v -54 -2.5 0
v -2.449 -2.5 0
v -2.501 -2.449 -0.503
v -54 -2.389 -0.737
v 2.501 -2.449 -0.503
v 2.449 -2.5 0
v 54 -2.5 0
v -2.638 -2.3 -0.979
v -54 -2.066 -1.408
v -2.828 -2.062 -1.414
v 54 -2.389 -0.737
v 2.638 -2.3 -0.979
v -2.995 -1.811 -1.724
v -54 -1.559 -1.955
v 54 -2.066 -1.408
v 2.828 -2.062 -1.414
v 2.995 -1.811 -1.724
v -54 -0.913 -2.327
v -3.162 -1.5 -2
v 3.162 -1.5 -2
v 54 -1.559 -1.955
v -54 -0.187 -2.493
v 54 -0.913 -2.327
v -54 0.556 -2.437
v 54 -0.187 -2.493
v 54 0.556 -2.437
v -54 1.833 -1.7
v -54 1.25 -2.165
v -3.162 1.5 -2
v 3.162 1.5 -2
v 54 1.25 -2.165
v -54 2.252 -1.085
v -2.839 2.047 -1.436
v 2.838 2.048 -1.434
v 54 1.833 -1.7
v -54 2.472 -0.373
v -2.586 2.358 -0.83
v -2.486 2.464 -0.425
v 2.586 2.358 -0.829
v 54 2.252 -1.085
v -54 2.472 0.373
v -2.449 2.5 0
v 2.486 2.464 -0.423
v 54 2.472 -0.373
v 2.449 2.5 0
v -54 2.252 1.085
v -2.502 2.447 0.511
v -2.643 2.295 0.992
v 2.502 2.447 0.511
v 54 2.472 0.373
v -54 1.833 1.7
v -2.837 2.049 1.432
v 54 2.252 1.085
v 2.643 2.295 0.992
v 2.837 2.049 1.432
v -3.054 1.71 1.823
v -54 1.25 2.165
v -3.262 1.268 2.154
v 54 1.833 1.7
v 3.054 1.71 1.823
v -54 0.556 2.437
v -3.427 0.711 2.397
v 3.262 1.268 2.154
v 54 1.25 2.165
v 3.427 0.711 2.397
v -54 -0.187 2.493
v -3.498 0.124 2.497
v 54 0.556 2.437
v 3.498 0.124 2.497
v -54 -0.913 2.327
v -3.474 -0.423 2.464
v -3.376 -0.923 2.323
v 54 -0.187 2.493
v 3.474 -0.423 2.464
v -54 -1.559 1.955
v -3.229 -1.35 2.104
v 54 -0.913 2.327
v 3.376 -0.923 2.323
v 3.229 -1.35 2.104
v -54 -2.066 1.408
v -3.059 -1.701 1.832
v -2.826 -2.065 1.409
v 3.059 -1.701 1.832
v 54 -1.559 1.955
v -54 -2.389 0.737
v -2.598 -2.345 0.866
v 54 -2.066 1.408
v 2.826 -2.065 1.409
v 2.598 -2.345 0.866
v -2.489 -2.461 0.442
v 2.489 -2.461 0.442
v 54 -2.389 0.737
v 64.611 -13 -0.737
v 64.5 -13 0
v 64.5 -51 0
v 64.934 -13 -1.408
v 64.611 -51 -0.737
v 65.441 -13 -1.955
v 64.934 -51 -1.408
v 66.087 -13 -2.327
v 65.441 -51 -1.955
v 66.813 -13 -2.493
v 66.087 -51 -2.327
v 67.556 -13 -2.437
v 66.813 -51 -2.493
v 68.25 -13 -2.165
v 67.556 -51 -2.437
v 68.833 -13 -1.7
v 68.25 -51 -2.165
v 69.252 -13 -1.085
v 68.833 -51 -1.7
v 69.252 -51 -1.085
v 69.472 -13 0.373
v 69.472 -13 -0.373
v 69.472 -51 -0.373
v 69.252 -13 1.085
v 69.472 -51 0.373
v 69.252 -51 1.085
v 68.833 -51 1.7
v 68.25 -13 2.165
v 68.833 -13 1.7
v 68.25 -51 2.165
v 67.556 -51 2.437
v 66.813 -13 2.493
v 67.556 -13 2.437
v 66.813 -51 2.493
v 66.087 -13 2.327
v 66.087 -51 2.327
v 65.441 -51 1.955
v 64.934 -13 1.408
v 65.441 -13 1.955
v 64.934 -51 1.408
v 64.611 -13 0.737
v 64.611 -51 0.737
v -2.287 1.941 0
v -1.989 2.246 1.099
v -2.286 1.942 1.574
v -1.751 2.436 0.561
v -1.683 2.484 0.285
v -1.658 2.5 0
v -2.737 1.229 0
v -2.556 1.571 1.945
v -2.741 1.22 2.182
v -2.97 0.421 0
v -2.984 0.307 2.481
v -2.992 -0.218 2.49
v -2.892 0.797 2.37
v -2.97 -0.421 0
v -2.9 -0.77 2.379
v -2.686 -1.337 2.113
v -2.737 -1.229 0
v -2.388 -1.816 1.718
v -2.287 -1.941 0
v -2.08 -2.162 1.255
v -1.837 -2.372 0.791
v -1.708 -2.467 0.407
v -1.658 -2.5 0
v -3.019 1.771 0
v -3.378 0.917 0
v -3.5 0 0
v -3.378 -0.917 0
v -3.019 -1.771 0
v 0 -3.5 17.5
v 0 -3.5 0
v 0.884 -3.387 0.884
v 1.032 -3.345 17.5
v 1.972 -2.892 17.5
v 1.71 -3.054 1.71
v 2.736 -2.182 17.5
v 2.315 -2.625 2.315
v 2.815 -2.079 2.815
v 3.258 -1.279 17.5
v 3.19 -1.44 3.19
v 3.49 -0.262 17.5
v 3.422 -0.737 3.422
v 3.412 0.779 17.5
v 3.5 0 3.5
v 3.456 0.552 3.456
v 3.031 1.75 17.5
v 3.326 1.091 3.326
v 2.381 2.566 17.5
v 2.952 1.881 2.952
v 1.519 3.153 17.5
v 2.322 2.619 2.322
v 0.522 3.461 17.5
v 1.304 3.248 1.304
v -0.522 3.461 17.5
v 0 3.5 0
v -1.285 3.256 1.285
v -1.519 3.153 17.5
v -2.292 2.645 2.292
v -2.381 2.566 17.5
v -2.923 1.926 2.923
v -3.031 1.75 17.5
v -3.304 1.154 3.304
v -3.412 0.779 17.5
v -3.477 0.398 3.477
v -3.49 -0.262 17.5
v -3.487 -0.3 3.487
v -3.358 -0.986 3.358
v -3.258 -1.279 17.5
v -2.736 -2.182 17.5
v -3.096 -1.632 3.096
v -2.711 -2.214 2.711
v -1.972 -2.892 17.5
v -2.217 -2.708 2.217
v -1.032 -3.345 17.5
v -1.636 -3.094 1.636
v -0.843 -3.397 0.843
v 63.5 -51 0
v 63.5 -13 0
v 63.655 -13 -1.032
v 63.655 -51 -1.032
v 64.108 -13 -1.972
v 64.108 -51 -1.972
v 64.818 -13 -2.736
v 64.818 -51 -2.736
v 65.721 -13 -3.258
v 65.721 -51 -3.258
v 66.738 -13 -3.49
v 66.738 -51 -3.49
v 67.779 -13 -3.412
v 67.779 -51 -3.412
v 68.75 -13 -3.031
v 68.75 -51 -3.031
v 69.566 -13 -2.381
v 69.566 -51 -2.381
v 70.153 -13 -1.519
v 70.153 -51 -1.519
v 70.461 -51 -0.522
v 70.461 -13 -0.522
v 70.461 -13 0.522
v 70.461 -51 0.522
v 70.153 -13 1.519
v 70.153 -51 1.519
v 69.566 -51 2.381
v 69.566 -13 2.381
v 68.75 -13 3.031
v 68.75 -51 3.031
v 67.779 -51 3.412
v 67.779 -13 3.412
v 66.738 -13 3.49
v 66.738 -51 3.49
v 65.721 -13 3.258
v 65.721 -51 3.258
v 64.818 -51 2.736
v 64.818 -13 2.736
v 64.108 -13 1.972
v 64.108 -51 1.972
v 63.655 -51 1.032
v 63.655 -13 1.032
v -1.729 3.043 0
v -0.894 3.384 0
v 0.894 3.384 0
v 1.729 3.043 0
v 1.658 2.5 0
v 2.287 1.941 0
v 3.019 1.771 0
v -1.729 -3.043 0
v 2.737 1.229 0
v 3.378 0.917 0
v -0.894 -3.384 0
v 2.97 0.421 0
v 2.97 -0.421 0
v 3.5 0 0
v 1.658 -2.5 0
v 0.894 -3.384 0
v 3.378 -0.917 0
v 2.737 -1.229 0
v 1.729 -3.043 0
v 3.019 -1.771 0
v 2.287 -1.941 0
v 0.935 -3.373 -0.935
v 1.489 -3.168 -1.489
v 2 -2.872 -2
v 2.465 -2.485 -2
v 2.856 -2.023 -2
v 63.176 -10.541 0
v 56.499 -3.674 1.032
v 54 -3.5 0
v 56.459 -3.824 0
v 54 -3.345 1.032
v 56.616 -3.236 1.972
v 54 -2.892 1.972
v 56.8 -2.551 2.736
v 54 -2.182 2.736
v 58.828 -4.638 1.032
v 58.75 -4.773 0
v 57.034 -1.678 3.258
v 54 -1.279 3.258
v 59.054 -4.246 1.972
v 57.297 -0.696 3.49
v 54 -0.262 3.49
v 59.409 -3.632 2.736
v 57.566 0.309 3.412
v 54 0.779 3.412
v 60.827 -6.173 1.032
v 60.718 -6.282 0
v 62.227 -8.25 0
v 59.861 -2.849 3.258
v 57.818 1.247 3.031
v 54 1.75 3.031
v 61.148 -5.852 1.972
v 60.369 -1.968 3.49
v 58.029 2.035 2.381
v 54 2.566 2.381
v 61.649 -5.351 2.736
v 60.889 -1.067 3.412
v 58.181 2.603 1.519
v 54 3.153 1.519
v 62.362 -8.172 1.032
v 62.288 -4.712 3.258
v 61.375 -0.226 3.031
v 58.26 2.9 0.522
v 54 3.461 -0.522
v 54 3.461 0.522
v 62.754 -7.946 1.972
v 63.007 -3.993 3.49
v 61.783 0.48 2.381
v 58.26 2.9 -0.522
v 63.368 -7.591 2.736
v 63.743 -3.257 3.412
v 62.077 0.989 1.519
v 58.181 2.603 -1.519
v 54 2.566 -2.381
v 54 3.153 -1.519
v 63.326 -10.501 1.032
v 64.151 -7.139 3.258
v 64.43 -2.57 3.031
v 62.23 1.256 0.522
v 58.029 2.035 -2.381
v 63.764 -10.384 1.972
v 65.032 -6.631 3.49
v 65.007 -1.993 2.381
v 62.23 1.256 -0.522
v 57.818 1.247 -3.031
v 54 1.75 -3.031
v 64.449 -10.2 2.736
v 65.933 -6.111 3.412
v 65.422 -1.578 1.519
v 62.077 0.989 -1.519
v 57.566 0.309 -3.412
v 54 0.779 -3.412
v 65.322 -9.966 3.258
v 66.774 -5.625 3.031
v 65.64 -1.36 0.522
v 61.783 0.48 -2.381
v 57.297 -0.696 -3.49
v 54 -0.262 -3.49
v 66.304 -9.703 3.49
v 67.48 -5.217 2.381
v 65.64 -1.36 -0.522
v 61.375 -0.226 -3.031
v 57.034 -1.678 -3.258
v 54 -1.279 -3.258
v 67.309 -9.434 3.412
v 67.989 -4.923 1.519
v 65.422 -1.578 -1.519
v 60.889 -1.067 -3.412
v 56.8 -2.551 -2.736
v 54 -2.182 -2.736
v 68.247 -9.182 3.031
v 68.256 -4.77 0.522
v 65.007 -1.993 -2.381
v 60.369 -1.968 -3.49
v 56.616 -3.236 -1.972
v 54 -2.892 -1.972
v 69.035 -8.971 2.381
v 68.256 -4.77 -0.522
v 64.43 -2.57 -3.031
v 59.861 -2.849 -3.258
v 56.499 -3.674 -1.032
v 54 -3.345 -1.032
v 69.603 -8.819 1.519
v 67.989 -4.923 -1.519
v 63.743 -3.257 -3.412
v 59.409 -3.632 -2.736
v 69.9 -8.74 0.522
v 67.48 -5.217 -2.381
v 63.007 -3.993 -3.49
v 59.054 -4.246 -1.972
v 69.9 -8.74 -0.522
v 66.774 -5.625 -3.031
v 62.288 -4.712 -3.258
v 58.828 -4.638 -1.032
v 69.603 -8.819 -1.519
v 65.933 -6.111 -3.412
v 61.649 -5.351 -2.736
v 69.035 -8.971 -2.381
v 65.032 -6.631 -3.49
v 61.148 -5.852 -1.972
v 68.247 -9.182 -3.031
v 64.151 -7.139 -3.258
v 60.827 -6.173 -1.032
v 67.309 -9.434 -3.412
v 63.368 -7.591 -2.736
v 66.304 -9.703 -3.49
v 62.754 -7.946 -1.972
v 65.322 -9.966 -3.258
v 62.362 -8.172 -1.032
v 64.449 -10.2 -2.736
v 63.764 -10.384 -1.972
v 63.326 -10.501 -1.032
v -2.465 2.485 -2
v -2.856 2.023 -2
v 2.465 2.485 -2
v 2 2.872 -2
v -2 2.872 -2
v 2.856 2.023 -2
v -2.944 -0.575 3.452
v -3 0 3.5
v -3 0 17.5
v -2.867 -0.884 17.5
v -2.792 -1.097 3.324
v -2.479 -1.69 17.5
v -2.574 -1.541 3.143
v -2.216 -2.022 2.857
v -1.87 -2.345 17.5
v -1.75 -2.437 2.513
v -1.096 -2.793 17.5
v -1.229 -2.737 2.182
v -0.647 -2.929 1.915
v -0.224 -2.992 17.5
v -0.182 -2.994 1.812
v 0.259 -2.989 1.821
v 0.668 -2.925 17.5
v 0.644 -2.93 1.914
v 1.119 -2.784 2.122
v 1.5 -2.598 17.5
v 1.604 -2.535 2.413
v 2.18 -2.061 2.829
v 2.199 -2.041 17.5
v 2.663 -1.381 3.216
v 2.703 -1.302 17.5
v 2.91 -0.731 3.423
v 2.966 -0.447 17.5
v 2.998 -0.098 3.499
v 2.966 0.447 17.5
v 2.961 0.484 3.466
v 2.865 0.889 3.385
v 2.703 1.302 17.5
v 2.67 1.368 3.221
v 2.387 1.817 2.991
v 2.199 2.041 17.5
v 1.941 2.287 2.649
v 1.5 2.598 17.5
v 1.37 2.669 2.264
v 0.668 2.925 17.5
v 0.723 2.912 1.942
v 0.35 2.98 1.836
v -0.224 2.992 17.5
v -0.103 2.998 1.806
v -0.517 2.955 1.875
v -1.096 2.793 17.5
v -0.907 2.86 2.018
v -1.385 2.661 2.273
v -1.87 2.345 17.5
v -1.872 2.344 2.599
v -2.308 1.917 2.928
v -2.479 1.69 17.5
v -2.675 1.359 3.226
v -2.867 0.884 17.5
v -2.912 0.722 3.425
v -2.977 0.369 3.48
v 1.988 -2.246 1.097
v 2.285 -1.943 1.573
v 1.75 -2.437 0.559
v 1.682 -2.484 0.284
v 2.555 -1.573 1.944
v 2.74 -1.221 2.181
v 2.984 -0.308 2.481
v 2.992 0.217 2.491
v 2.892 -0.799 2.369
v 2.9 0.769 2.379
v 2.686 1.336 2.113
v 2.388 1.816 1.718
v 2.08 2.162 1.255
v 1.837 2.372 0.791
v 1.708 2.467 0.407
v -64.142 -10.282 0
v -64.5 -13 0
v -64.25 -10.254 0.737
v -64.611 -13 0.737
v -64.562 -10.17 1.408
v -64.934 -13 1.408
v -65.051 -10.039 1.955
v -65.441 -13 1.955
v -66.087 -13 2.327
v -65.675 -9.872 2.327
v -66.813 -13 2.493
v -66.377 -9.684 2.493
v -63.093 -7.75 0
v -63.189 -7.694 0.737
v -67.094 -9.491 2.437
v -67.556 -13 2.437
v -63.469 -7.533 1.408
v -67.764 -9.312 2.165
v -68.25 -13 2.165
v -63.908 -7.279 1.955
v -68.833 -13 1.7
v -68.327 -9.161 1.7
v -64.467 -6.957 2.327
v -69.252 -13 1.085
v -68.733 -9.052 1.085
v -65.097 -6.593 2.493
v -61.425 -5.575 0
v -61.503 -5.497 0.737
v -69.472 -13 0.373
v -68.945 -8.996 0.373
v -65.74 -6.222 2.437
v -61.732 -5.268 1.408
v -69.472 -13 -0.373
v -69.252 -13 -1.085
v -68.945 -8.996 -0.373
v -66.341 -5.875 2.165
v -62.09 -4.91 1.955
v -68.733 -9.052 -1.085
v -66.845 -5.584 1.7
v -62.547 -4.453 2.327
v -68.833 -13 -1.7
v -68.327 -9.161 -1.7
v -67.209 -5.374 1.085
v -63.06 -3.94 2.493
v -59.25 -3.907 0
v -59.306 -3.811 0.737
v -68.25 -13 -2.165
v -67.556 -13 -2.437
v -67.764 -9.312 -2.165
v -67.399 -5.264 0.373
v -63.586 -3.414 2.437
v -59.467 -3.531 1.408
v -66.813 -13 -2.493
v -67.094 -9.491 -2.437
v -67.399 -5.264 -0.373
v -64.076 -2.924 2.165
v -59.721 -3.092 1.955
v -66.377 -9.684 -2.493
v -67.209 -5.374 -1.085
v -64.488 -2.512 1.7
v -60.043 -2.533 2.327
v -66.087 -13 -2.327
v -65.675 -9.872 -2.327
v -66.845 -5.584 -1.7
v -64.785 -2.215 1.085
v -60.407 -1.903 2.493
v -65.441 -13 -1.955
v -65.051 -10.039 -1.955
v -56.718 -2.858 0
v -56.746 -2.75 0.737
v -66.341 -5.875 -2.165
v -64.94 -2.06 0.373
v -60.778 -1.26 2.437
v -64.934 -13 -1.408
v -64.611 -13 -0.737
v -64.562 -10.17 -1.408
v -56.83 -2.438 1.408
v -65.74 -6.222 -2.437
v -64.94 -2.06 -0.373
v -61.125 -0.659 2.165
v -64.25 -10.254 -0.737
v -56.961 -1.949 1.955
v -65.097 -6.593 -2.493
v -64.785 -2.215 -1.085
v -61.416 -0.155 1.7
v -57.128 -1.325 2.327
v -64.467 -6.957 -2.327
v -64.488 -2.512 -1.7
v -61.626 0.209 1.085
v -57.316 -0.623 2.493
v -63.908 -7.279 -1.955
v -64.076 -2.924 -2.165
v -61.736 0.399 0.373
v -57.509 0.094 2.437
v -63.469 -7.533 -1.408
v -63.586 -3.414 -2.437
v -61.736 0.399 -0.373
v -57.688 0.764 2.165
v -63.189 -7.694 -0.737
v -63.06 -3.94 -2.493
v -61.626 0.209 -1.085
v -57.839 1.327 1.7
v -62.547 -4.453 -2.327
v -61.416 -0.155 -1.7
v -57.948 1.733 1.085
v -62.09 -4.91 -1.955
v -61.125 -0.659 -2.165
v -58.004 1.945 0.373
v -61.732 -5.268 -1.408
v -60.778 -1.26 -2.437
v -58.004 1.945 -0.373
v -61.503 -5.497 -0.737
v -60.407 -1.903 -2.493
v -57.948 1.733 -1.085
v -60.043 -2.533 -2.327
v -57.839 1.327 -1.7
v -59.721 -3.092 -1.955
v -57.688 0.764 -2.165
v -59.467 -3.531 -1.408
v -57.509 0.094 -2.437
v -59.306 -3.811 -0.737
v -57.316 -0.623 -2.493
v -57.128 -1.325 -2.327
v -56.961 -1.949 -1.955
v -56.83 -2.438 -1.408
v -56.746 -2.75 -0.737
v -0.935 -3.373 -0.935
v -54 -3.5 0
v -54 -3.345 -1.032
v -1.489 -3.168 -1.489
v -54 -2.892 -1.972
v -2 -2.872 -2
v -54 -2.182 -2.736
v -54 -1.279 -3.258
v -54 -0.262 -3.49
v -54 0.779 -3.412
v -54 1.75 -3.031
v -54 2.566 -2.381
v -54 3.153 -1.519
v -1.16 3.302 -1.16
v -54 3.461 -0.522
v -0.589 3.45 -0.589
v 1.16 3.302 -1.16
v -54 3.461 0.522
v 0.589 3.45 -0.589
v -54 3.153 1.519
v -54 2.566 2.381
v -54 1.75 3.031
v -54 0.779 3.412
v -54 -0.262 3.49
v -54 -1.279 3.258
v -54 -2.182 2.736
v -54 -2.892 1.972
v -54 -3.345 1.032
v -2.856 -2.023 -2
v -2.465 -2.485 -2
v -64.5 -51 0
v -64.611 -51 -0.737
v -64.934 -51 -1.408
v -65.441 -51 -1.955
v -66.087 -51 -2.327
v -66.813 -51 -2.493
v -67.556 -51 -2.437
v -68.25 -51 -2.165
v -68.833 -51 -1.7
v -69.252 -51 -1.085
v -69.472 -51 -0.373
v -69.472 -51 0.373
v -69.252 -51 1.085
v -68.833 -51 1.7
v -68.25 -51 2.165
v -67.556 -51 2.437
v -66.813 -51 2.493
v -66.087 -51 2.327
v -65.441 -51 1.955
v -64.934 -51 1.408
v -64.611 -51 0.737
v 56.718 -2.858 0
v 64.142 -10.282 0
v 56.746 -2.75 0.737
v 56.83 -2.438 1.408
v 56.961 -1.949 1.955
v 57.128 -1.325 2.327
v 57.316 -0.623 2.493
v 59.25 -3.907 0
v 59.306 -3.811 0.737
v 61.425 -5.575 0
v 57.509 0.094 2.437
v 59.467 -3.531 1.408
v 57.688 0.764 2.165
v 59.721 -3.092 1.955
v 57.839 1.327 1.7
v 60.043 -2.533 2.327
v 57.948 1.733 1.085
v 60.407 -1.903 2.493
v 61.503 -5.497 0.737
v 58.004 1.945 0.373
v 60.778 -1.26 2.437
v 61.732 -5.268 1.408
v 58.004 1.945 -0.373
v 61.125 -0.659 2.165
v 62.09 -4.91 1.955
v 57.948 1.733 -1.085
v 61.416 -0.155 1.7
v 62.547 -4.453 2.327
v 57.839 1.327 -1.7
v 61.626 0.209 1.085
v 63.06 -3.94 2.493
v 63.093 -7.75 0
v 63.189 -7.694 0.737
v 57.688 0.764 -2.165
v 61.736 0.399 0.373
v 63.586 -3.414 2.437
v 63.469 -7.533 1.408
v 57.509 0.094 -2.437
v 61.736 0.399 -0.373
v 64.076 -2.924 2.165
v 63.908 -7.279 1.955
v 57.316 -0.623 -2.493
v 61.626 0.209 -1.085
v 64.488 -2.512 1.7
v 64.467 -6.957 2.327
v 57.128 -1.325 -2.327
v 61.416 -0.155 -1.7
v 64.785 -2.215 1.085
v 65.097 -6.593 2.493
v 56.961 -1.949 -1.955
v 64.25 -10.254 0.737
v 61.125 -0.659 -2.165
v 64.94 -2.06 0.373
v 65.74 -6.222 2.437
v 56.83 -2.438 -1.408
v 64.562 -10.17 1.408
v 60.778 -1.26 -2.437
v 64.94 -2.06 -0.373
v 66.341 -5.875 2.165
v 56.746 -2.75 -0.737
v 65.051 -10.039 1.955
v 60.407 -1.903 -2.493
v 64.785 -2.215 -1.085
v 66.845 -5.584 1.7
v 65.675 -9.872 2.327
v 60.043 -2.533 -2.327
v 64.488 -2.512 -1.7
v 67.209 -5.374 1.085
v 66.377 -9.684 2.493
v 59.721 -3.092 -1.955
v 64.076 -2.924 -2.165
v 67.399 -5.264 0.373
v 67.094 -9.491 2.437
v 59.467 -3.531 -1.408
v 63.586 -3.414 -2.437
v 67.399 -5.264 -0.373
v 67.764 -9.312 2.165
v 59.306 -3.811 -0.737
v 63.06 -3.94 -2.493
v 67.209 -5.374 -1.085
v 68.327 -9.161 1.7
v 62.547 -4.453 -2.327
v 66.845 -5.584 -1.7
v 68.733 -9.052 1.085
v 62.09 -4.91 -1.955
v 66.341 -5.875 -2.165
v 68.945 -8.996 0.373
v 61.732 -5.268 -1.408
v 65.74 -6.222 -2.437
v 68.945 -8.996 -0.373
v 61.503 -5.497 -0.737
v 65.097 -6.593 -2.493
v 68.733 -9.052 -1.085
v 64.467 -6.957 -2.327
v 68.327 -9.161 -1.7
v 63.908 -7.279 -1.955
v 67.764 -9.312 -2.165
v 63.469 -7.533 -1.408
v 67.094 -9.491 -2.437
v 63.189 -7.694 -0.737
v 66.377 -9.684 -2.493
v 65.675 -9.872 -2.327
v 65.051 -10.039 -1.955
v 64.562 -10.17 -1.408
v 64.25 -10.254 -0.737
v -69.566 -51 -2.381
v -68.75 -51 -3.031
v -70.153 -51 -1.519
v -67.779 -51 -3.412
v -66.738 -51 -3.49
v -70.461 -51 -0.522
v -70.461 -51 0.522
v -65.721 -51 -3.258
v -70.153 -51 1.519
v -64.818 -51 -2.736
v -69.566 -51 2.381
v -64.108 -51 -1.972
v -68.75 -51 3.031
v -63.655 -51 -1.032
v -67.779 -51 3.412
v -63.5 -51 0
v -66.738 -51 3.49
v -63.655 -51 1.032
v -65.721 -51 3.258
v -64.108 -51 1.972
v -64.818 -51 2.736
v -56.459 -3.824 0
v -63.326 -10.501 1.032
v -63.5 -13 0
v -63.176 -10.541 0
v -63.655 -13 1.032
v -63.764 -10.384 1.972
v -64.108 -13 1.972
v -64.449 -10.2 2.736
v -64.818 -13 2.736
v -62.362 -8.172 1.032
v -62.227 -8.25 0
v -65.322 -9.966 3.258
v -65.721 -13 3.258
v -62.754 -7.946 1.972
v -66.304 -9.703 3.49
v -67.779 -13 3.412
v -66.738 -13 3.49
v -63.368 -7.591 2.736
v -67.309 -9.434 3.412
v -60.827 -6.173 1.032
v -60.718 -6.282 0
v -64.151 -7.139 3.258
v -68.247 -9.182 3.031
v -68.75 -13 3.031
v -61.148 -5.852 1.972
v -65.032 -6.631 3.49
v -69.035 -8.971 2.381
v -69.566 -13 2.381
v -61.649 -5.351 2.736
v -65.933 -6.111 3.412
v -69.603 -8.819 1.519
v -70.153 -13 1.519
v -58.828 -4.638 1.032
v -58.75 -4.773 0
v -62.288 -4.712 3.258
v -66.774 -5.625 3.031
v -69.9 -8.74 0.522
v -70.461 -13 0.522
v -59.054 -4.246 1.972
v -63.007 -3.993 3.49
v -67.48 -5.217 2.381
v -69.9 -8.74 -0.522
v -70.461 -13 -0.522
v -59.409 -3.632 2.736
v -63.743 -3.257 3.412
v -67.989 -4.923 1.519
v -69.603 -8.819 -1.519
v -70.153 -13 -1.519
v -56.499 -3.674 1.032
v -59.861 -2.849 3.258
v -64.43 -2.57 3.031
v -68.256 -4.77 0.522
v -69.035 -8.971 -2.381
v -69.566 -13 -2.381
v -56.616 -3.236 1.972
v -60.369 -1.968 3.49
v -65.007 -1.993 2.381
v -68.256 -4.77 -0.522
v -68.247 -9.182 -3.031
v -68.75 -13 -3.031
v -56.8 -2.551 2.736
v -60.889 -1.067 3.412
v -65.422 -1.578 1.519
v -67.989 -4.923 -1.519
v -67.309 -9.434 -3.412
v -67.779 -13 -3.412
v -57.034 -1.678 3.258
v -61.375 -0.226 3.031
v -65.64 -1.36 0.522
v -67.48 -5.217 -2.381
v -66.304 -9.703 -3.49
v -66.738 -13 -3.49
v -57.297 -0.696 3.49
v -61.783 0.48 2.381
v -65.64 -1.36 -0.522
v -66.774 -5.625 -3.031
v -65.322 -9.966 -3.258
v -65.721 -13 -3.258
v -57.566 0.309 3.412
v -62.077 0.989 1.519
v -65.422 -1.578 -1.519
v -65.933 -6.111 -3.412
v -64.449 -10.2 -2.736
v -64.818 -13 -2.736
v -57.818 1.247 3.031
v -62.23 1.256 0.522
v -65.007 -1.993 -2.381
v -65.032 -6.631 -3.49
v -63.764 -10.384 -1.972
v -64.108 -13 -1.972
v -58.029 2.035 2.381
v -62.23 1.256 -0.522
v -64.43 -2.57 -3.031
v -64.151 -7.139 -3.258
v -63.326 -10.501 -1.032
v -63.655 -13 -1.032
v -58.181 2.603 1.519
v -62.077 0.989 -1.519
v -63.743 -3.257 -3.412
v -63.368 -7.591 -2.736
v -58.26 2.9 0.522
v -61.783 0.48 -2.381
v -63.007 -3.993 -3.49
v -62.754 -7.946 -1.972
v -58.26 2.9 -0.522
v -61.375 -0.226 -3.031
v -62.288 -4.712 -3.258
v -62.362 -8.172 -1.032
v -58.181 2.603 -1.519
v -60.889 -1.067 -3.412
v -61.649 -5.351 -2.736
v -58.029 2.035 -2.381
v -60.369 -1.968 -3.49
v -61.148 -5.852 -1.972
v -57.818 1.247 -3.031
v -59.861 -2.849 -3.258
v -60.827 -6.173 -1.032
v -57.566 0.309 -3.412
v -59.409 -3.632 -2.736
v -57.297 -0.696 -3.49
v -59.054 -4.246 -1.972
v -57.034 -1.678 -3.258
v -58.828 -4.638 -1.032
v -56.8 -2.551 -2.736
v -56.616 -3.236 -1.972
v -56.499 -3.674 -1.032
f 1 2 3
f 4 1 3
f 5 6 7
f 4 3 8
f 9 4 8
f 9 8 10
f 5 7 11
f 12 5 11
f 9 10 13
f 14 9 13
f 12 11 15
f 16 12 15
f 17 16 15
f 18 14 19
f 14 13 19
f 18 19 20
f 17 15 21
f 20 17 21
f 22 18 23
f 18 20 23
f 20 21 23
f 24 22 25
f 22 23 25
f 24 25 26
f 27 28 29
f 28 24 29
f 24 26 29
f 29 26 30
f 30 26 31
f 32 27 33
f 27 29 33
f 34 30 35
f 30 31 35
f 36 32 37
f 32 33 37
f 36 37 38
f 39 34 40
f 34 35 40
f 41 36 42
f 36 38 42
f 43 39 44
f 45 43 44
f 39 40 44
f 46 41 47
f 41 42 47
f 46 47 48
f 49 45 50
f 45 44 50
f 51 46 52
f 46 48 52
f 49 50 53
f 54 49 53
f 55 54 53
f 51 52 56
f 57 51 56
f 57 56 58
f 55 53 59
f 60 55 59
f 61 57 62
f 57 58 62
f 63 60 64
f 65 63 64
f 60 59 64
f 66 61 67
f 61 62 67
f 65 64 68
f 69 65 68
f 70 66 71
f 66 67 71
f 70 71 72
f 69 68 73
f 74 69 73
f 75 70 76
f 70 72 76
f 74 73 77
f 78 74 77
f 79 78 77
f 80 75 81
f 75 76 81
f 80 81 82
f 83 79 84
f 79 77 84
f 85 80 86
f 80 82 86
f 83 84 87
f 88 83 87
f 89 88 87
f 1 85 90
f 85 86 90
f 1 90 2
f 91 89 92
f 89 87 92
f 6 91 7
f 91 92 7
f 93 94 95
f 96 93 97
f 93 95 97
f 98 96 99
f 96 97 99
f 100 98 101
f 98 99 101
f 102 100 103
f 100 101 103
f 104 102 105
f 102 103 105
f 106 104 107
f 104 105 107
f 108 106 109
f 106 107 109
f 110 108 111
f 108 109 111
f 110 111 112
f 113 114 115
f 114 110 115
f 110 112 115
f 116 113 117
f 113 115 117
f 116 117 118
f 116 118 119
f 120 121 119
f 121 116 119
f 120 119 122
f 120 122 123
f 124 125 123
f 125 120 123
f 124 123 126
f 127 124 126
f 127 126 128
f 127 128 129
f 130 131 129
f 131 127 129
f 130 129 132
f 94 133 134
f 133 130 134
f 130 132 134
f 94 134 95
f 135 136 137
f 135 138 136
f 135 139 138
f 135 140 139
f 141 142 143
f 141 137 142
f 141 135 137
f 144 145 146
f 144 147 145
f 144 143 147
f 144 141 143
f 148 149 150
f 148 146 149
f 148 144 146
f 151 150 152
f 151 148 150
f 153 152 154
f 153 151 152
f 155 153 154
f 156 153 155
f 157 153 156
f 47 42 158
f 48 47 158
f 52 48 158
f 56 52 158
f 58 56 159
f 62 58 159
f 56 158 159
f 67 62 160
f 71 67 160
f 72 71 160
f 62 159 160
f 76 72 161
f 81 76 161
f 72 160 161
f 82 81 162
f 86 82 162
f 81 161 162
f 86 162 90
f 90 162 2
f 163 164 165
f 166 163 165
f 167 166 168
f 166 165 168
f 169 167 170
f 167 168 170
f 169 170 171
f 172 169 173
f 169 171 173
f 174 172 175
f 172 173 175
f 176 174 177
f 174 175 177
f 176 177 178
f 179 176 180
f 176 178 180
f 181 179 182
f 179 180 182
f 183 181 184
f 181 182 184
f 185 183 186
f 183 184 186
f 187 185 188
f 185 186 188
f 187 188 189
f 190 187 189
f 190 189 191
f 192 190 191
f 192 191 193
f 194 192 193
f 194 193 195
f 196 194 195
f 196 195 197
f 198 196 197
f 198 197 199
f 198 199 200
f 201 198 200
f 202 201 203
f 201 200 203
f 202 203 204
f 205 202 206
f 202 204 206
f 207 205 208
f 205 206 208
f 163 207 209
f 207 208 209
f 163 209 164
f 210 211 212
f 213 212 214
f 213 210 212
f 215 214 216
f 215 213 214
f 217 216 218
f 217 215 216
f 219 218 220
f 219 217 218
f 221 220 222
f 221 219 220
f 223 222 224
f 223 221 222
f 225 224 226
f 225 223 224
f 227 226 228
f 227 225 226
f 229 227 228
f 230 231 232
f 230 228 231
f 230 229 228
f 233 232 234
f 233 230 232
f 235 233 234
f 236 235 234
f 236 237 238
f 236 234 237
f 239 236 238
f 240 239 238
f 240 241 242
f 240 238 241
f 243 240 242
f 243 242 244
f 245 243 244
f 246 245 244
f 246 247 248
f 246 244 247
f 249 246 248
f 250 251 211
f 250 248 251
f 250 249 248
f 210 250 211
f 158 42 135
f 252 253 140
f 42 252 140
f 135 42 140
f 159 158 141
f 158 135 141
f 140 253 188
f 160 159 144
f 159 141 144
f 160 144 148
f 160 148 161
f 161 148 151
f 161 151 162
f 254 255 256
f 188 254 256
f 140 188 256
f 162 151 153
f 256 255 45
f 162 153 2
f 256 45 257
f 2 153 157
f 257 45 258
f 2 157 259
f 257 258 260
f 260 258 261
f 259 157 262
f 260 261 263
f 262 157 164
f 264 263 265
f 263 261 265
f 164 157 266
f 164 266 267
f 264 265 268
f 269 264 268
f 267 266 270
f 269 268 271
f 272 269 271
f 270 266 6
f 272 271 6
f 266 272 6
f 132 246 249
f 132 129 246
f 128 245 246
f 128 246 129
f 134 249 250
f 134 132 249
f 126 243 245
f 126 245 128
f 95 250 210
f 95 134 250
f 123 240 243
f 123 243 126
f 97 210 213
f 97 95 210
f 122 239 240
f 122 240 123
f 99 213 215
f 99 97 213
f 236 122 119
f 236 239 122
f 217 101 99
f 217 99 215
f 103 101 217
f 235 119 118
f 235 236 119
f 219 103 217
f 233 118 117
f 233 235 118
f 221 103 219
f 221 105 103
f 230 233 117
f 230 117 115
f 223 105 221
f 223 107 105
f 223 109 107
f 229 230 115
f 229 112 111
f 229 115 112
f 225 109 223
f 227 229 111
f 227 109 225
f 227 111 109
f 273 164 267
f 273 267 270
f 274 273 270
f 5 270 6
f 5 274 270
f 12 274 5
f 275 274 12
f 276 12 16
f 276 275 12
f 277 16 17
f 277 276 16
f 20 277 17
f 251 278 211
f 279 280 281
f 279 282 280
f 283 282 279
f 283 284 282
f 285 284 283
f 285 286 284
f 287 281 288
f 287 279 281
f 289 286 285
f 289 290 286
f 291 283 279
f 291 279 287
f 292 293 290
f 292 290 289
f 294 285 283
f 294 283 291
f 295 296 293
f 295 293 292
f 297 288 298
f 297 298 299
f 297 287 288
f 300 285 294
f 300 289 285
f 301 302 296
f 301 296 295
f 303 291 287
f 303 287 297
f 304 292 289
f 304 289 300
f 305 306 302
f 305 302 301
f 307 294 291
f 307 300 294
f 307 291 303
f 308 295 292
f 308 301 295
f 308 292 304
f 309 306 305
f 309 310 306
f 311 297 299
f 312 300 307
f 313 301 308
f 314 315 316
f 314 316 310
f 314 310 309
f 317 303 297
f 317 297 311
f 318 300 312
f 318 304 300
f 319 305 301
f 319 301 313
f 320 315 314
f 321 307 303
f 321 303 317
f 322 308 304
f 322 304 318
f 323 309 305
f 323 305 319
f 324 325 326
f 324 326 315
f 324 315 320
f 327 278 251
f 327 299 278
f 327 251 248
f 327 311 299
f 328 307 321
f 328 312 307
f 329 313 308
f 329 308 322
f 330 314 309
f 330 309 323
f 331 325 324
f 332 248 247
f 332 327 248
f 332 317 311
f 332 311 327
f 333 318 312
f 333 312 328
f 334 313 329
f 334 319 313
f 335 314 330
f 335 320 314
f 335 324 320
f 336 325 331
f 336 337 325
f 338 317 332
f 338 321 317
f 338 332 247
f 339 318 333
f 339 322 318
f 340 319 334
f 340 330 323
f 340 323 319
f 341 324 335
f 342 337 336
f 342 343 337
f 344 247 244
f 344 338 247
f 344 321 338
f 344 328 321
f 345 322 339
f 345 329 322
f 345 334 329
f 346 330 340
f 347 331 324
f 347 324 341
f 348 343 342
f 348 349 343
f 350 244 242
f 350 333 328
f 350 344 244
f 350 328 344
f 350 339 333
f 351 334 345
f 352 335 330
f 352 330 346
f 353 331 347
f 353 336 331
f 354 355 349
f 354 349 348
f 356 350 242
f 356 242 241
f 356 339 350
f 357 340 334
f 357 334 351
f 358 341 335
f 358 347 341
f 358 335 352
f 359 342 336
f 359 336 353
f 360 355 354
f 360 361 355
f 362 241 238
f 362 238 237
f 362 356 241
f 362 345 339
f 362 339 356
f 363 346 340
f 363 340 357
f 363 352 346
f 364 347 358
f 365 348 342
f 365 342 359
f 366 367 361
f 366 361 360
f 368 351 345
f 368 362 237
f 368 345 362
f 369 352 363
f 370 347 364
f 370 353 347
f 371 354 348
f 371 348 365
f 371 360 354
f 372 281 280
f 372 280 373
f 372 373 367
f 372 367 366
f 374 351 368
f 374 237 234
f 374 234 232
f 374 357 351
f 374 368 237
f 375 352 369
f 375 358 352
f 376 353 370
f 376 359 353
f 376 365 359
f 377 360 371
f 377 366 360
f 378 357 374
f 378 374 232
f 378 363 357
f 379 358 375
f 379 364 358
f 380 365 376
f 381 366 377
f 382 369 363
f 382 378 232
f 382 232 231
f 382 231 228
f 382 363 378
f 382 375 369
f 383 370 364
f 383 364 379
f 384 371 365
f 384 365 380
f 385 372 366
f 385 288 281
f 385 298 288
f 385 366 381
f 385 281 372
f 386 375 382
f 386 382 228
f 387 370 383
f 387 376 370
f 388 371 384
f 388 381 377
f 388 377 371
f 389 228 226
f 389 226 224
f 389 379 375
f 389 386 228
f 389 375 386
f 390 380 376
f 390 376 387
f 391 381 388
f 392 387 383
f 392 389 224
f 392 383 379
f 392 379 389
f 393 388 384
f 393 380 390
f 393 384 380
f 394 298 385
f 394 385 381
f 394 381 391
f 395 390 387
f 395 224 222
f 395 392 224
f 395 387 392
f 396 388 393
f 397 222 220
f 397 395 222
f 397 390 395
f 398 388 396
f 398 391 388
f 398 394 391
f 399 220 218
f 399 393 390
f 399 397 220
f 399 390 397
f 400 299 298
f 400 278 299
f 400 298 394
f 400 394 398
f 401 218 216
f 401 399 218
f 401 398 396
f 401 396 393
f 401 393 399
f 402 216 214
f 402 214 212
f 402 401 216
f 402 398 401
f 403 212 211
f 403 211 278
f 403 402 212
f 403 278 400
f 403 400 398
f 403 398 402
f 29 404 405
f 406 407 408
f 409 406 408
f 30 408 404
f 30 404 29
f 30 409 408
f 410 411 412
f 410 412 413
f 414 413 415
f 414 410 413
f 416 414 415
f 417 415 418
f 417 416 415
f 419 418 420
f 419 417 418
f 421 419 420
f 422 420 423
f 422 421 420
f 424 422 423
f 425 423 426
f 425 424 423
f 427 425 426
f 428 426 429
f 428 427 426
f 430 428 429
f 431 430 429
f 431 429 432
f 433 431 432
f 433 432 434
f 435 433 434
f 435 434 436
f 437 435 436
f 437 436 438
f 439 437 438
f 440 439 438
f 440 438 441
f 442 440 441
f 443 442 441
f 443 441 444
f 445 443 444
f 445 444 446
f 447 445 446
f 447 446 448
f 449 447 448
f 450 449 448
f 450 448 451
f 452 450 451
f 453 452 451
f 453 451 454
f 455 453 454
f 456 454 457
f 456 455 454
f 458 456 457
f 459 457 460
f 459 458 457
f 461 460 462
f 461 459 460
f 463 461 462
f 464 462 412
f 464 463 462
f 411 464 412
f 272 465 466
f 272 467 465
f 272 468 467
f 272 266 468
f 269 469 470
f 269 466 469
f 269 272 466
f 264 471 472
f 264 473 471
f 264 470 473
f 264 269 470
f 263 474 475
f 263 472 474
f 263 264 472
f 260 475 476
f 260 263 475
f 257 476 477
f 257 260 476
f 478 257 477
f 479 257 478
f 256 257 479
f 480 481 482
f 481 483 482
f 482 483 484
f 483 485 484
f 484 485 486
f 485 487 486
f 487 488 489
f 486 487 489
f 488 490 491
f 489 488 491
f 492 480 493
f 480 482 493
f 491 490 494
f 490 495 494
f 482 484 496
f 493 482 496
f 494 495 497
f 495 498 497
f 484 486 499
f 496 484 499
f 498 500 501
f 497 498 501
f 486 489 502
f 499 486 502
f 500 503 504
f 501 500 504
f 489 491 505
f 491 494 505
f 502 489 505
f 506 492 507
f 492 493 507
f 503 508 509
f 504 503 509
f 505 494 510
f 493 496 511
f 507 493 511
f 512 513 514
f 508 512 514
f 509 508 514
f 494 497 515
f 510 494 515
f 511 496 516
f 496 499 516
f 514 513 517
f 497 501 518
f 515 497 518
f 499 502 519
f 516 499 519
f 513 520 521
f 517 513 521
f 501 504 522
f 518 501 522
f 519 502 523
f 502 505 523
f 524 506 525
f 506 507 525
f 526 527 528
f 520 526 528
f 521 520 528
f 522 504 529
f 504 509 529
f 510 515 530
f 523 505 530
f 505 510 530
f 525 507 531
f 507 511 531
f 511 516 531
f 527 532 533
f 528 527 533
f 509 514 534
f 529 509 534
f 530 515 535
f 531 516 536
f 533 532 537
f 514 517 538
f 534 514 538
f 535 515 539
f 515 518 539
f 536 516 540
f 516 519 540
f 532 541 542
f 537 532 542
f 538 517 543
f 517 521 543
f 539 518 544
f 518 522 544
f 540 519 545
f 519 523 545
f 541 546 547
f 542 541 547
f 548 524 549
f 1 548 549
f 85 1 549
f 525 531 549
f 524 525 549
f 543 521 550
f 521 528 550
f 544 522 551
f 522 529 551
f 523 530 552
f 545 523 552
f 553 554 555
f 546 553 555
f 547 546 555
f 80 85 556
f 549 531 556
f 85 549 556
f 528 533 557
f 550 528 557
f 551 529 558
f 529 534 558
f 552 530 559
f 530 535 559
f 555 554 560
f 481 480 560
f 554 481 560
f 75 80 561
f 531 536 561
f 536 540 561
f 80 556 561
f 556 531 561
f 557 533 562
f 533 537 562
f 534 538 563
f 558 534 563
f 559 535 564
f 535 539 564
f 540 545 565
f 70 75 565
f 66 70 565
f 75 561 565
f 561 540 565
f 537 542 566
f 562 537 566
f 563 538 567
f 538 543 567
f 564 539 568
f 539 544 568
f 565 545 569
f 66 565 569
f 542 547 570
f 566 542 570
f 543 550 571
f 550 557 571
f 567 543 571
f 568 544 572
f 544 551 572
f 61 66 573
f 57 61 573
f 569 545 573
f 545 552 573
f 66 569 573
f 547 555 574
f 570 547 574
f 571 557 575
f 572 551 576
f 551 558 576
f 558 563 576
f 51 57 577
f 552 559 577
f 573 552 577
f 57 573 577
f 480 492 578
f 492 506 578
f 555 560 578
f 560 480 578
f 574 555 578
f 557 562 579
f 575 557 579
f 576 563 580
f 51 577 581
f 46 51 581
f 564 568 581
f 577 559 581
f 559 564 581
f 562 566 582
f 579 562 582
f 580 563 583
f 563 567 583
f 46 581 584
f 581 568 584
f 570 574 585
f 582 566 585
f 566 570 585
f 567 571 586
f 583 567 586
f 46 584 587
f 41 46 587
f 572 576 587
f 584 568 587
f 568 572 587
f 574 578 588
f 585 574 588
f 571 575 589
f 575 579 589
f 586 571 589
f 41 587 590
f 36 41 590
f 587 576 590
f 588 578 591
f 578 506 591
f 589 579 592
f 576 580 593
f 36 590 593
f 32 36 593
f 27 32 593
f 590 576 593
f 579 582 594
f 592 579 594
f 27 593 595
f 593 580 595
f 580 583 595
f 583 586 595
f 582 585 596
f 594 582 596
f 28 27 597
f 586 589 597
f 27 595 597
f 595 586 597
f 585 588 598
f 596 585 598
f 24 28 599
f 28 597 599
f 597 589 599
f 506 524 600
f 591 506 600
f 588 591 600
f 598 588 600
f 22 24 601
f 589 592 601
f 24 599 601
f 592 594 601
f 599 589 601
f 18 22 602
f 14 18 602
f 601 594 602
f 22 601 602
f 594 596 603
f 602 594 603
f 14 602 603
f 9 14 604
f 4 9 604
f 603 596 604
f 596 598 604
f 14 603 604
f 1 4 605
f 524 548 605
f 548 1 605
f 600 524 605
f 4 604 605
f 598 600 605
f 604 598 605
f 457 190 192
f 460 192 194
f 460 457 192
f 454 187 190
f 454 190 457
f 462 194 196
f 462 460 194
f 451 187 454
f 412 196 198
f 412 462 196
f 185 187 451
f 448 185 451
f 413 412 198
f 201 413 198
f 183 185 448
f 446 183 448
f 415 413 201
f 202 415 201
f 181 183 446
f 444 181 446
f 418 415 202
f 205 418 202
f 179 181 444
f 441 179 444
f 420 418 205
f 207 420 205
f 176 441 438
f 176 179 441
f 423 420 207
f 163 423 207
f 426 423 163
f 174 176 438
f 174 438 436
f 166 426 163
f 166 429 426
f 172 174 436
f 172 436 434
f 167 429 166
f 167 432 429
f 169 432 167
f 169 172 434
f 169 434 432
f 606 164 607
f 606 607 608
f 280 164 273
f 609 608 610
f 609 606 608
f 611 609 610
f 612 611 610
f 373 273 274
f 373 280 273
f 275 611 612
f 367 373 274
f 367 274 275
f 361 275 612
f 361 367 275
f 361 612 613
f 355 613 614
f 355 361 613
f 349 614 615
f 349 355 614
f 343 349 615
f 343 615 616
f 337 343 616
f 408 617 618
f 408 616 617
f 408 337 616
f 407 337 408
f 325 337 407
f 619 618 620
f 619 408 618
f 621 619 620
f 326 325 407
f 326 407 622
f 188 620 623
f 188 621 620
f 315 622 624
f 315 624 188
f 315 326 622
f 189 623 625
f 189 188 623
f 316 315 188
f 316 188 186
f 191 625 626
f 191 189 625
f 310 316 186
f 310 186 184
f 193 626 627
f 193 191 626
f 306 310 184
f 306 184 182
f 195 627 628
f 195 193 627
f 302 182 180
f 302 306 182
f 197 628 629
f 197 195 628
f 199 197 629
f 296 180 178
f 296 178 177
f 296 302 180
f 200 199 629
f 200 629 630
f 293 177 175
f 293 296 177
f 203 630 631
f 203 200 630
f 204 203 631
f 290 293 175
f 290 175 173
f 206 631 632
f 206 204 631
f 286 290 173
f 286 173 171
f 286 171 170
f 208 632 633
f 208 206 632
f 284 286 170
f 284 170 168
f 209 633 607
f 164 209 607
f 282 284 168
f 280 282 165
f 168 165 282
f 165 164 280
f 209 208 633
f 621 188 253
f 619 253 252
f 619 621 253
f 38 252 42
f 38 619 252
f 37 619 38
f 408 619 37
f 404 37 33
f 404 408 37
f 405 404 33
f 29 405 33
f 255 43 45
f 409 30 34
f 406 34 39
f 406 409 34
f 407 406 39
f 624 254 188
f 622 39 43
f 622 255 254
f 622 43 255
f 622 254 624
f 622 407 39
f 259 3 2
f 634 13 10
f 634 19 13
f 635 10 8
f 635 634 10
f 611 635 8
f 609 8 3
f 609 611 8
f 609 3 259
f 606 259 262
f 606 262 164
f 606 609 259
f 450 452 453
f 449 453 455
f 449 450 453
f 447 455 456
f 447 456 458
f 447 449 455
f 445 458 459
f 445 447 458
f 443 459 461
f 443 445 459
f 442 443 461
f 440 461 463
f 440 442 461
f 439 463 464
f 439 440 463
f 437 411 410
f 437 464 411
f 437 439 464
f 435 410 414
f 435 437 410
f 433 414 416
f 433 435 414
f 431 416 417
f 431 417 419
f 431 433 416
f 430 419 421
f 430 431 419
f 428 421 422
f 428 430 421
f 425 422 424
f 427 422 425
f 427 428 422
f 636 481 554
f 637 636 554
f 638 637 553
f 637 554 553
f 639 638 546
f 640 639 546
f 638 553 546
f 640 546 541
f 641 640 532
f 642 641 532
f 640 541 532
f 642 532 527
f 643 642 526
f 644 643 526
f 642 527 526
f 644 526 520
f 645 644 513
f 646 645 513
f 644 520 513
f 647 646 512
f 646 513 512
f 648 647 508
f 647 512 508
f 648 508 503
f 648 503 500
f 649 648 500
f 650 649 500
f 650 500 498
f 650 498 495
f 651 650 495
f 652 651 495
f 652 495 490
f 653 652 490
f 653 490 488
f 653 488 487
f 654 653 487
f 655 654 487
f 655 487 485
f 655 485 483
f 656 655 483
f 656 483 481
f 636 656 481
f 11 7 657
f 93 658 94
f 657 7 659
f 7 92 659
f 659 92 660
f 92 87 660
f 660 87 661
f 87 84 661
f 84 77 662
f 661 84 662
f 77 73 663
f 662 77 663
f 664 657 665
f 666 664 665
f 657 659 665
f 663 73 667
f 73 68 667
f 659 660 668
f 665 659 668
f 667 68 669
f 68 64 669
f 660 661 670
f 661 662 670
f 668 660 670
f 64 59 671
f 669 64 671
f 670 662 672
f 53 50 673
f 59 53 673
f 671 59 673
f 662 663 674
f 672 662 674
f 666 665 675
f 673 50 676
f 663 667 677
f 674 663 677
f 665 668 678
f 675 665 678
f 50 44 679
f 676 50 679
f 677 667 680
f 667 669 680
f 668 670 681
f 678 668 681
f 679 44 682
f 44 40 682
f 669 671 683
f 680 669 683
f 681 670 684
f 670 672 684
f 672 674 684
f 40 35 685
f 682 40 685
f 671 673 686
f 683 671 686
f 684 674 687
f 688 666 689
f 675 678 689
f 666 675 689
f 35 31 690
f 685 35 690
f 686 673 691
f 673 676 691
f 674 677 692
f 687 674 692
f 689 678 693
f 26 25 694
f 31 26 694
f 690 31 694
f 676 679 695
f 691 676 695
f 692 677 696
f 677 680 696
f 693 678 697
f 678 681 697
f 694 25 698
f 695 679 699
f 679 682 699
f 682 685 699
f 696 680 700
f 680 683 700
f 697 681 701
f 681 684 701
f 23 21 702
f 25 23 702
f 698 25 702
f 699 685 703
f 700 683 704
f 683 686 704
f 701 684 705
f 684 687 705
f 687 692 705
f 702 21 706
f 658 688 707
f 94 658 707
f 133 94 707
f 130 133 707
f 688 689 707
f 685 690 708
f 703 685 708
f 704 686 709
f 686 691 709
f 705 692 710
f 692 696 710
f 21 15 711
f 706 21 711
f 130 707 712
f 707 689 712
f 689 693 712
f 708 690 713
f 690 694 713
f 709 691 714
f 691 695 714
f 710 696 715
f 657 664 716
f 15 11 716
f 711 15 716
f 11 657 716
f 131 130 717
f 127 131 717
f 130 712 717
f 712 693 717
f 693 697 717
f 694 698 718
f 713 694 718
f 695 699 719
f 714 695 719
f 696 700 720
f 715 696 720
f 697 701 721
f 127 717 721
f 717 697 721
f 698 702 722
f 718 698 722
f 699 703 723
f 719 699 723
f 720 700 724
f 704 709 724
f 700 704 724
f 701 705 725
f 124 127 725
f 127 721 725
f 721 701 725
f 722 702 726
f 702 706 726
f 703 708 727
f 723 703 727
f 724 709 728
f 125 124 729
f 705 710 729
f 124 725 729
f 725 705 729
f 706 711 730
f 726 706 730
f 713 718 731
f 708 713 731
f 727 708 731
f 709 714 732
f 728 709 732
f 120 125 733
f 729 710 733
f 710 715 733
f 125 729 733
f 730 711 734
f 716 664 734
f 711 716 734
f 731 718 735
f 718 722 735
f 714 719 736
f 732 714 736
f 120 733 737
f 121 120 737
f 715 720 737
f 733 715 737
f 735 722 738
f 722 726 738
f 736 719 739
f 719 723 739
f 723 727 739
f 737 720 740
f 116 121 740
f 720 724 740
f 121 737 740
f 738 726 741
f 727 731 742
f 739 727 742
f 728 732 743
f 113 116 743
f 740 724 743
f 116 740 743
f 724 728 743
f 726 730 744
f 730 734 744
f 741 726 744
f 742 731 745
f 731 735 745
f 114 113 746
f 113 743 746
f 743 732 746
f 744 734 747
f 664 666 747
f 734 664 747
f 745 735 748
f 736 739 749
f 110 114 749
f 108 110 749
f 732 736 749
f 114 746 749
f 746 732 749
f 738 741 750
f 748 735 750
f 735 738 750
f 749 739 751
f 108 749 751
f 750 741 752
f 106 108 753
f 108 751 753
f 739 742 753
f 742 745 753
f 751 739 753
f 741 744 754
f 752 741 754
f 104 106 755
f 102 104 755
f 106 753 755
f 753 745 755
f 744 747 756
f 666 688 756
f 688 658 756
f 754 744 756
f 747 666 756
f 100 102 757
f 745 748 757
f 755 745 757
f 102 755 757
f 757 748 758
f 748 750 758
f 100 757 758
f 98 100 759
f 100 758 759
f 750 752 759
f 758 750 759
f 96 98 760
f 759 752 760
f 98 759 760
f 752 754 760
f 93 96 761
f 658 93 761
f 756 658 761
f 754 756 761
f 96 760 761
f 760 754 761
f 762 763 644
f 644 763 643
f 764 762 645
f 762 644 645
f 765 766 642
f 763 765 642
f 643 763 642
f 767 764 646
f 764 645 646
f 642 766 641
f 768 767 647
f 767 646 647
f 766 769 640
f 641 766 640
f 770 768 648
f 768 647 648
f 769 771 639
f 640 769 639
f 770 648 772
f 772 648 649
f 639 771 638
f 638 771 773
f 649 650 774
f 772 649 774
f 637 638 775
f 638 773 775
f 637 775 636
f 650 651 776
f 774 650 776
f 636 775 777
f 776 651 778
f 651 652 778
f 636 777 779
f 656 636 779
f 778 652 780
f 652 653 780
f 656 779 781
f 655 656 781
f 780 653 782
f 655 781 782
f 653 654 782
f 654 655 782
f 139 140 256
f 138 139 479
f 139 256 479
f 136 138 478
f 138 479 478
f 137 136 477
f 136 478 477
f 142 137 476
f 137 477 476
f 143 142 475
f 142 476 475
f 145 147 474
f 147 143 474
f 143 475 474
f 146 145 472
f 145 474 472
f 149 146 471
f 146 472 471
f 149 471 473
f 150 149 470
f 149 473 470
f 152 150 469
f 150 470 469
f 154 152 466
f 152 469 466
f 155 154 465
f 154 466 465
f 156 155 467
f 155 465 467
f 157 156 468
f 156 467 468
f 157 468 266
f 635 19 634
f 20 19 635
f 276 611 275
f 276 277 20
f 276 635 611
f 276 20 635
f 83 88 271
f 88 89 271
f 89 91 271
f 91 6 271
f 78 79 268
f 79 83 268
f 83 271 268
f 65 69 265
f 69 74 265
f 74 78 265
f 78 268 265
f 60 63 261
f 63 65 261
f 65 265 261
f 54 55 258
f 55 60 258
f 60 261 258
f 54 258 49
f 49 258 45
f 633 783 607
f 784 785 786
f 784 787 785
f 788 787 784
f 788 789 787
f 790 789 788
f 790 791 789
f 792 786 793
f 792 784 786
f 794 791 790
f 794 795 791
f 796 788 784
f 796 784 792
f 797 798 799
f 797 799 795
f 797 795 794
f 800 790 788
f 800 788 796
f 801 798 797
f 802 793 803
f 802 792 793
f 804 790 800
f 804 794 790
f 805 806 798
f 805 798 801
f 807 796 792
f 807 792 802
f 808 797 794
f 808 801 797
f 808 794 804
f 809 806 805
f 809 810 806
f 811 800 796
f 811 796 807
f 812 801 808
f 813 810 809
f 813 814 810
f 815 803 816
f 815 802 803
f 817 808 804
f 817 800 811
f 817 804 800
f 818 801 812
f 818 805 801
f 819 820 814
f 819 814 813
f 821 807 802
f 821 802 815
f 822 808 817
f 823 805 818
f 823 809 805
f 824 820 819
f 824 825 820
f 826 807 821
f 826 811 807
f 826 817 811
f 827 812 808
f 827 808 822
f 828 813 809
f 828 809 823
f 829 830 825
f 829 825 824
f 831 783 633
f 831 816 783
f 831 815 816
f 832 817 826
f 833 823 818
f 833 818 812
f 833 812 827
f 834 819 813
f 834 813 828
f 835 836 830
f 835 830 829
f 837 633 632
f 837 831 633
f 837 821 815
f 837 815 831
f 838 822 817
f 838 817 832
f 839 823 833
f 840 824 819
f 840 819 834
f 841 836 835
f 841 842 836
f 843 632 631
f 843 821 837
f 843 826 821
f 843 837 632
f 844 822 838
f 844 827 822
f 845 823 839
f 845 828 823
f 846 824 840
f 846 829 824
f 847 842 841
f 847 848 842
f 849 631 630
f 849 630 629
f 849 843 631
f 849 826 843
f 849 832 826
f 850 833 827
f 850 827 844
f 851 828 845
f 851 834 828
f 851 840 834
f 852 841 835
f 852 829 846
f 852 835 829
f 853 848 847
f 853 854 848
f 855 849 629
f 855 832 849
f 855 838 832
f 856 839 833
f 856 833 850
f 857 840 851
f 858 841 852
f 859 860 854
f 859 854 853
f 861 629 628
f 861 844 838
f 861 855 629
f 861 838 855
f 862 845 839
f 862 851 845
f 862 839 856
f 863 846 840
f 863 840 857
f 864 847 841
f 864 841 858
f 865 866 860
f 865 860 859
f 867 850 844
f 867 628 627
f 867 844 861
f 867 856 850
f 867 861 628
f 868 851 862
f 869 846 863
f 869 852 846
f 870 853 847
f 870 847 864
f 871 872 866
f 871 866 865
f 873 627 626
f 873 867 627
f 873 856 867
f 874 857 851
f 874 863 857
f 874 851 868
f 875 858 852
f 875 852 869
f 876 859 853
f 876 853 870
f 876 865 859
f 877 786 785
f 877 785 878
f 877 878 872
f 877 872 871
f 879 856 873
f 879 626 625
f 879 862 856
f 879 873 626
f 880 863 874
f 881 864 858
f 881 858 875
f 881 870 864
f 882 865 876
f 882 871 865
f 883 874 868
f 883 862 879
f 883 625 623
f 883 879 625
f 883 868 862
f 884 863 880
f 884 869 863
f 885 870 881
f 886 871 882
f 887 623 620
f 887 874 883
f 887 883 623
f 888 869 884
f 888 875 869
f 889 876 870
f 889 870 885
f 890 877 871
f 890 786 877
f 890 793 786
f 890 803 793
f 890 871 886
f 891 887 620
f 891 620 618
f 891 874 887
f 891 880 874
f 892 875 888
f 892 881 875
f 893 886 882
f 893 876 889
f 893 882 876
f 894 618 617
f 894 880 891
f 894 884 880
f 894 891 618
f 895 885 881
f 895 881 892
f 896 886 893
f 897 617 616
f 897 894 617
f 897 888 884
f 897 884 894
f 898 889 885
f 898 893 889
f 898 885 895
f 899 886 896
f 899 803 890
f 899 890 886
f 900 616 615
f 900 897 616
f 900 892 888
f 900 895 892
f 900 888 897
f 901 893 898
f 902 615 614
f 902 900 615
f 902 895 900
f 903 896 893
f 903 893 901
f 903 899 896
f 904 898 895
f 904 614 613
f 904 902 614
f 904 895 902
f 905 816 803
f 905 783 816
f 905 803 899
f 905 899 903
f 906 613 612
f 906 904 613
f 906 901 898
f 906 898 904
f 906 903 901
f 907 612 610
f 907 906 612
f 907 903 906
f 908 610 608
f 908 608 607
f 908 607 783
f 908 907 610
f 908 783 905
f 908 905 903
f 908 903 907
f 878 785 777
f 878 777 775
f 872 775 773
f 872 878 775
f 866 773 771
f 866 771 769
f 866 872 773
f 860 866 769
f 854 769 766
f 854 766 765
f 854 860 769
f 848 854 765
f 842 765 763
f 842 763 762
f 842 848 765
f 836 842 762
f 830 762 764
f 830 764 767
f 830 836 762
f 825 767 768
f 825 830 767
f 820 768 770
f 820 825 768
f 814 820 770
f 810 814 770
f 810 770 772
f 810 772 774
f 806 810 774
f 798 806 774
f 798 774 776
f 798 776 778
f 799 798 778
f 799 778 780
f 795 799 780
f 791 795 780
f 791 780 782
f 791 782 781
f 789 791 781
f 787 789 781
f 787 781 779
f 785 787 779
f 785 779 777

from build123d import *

# Parameters (mm, degrees)
SWEEP_THIN2_PROFILE_R   = 3.5
SWEEP_THIN2_PROFILE_R_2 = 2.5
SKETCH57_R              = 3.5
SKETCH57_R_2            = 3
BOSS_EXTRUDE1_DEPTH     = 17.5
CUT_EXTRUDE1_START      = -2
SKETCH59_R              = 3.5
CUT_EXTRUDE1_DEPTH      = 2


with BuildPart() as part:
    # Sweep-Thin2: sweep along a path in Sketch28
    with BuildLine(Plane.XY) as sweep_thin2_path:
        Line((-67, -51), (-67, -13))
        ThreePointArc((-67, -13), (-63.192388155, -3.807611845), (-54, 0))
        Line((-54, 0), (54, 0))
        ThreePointArc((54, 0), (63.192388155, -3.807611845), (67, -13))
        Line((67, -13), (67, -51))
    # Sweep-Thin2 profile (on start of the path) → Sweep-Thin2 (sweep)
    with BuildSketch(Plane(origin=(-67, -51, 0), x_dir=(1, 0, 0), z_dir=(0, 1, 0))):
        Circle(SWEEP_THIN2_PROFILE_R)
        Circle(SWEEP_THIN2_PROFILE_R_2, mode=Mode.SUBTRACT)
    sweep(path=sweep_thin2_path.line)

    # Sketch57 → Boss-Extrude1 (add)
    with BuildSketch(Plane.XY):
        with Locations(Location((0, 0, 0), (0, 0, 270))):
            Circle(SKETCH57_R)
        with Locations(Location((0, 0, 0), (0, 0, 180))):
            Circle(SKETCH57_R_2, mode=Mode.SUBTRACT)
    extrude(amount=BOSS_EXTRUDE1_DEPTH)

    # Sketch59 → Cut-Extrude1 (cut)
    with BuildSketch(Plane.XY.offset(CUT_EXTRUDE1_START)):
        with Locations(Location((0, 0, 0), (0, 0, 270))):
            Circle(SKETCH59_R)
    extrude(amount=CUT_EXTRUDE1_DEPTH, mode=Mode.SUBTRACT)


solid = part.part
